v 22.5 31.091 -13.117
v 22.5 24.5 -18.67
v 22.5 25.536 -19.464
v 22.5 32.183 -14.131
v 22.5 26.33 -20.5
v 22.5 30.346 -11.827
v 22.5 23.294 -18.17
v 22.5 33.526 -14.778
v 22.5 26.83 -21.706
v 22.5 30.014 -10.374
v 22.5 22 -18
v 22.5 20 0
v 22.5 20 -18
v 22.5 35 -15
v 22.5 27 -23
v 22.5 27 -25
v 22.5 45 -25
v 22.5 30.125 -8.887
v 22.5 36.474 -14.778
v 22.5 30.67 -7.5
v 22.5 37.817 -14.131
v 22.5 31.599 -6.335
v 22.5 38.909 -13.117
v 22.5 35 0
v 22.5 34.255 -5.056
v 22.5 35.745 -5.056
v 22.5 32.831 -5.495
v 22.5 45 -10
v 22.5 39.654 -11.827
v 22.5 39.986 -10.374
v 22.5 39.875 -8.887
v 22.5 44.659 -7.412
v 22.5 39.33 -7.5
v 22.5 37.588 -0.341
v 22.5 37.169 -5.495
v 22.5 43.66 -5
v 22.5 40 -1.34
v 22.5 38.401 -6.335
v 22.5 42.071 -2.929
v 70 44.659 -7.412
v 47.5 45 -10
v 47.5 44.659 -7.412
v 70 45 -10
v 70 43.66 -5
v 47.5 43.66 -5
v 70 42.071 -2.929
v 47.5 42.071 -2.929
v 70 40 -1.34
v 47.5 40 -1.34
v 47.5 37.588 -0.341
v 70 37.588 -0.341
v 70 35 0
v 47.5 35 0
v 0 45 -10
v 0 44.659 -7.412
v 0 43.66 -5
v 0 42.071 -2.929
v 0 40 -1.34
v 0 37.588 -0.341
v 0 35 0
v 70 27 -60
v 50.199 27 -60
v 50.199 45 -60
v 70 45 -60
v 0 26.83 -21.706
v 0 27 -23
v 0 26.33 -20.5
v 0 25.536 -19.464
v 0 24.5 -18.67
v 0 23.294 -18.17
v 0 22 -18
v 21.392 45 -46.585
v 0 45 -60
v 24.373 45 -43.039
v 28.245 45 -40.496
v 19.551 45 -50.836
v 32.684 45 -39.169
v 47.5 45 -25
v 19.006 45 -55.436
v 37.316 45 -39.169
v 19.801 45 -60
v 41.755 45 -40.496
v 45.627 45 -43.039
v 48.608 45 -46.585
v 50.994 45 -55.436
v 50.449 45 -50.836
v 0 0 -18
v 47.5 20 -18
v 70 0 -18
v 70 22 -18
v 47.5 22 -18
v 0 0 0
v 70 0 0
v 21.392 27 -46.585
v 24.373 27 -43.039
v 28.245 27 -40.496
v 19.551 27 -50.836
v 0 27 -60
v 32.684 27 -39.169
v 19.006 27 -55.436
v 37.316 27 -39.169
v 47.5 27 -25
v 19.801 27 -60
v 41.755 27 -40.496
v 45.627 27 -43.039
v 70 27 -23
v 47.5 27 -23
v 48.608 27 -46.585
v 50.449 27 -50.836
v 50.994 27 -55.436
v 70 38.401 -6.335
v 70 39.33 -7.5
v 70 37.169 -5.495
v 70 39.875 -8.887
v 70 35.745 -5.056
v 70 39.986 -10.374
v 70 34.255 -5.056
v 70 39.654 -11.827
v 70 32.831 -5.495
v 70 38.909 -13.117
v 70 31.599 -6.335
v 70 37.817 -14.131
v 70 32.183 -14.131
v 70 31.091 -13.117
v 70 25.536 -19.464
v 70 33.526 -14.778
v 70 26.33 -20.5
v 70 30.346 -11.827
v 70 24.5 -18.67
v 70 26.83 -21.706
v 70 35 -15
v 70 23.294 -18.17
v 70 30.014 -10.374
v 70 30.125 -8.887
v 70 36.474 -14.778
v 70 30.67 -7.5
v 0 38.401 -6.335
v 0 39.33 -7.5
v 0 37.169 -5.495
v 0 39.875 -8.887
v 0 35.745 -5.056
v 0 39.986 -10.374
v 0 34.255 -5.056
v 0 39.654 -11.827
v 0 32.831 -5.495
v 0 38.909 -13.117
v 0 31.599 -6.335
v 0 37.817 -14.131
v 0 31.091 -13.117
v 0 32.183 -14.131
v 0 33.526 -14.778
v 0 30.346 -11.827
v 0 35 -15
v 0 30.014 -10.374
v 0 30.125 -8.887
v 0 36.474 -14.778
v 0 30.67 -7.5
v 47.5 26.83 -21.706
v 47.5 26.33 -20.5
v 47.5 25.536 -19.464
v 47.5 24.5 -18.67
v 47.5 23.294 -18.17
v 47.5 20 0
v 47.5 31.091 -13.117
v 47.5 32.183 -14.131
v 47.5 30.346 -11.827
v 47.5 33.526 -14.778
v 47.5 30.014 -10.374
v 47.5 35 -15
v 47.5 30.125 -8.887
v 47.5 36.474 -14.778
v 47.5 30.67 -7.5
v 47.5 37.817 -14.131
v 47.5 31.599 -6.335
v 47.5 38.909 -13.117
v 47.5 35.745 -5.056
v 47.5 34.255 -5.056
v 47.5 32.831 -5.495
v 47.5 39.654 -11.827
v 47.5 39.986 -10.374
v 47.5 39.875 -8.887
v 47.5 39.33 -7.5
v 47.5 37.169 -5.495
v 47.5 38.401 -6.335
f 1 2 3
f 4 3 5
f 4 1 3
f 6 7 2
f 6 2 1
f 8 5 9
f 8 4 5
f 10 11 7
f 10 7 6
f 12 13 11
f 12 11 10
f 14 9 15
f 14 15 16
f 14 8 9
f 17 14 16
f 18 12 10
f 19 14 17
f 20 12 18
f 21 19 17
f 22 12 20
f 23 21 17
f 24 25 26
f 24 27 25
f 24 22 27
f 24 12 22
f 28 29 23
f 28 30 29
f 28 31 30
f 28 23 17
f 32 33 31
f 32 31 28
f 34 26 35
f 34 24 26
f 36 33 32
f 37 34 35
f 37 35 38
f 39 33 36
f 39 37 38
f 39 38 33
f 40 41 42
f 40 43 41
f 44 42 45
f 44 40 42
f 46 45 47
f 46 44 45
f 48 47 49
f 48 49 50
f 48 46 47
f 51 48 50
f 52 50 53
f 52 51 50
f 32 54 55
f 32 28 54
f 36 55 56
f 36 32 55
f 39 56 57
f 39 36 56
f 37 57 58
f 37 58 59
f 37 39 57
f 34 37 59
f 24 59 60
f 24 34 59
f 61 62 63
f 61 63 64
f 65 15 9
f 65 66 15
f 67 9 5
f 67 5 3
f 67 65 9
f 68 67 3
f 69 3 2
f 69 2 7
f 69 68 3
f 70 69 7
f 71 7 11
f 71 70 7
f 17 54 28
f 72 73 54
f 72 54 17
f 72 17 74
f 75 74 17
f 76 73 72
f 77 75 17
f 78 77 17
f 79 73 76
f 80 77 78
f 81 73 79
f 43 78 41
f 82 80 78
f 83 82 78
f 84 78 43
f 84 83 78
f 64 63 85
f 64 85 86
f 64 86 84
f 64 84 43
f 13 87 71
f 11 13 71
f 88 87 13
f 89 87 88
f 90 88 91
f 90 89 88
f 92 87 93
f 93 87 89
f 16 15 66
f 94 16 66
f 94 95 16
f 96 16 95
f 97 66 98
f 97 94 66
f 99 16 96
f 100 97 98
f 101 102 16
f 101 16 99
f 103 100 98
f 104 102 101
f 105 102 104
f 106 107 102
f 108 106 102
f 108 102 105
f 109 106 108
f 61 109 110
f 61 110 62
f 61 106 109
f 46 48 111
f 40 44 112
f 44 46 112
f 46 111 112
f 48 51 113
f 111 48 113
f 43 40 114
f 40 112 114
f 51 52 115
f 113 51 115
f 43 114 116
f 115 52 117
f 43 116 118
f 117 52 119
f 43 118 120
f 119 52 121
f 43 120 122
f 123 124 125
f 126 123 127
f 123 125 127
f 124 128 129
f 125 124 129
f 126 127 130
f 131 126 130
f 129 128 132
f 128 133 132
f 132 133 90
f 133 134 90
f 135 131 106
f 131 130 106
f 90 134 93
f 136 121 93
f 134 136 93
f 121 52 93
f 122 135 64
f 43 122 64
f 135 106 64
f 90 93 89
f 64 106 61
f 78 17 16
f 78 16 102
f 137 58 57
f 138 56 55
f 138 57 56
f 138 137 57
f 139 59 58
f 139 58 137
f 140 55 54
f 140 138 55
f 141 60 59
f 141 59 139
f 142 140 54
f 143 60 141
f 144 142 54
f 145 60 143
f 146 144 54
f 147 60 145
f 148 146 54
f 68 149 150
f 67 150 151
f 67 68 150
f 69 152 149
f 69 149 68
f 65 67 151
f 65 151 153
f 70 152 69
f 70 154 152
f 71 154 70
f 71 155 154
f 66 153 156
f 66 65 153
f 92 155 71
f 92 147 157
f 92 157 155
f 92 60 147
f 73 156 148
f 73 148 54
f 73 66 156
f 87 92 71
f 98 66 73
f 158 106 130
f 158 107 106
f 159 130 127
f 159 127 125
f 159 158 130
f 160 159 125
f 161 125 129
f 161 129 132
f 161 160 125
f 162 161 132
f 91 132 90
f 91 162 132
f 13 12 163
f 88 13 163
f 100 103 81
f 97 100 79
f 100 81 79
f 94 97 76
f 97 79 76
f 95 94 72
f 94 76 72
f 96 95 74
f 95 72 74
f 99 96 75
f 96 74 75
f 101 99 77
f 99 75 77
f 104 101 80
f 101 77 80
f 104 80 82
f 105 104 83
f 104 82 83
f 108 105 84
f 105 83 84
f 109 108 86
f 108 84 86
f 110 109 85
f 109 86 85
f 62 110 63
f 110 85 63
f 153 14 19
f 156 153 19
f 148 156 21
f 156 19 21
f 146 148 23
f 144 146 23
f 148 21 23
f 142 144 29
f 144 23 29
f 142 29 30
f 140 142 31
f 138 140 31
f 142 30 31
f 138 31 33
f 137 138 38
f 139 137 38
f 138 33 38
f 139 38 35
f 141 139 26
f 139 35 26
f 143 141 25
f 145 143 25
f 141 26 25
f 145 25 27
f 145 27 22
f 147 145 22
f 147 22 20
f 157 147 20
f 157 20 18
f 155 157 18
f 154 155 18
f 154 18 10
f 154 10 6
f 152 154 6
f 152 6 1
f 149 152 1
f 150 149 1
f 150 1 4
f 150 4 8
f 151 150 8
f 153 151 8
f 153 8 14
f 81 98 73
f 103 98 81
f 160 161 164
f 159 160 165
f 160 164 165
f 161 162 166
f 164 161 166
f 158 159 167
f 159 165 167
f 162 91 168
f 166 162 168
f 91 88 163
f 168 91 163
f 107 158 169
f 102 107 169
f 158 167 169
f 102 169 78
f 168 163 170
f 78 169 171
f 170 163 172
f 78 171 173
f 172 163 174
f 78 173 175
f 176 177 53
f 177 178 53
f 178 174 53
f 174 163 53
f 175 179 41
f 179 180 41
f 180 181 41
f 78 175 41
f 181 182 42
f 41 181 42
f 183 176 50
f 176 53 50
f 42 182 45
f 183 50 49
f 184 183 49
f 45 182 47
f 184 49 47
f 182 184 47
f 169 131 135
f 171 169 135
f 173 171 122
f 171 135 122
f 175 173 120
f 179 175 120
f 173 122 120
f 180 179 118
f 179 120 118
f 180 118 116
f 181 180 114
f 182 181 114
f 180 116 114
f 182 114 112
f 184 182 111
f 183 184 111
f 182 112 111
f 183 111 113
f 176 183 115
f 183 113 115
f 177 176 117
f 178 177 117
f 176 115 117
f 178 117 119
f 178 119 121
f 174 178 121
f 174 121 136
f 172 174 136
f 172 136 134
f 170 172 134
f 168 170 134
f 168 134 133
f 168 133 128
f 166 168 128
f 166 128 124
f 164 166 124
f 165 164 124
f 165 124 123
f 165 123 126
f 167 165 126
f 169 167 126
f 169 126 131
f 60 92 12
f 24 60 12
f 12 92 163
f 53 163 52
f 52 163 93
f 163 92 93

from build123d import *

# Parameters (mm, degrees)
SKETCH1_W           = 70
SKETCH1_H           = 60
BOSS_EXTRUDE1_DEPTH = 45
SKETCH2_W           = 42
SKETCH2_H           = 27
CUT_EXTRUDE1_DEPTH  = 103.591422643
SKETCH3_R           = 16
CUT_EXTRUDE2_DEPTH  = 45
SKETCH4_W           = 25
SKETCH4_H           = 25
CUT_EXTRUDE3_DEPTH  = 25
FILLET1_R           = 10
FILLET2_R           = 5
SKETCH9_R           = 5
CUT_EXTRUDE4_DEPTH  = 103.591422643


with BuildPart() as part:
    # Sketch1 → Boss-Extrude1 (new body)
    with BuildSketch(Plane(origin=(0, 0, 0), x_dir=(1, 0, 0), z_dir=(0, 1, 0))):
        with Locations((35, 30)):
            Rectangle(SKETCH1_W, SKETCH1_H)
    extrude(amount=BOSS_EXTRUDE1_DEPTH)

    # Sketch2 → Cut-Extrude1 (cut, through all)
    with BuildSketch(Plane(origin=(70, 0, 0), x_dir=(0, 0, -1), z_dir=(1, 0, 0))):
        with Locations((39, 13.5)):
            Rectangle(SKETCH2_W, SKETCH2_H)
    extrude(amount=-CUT_EXTRUDE1_DEPTH, mode=Mode.SUBTRACT)

    # Sketch3 → Cut-Extrude2 (cut)
    with BuildSketch(Plane(origin=(0, 45, 0), x_dir=(1, 0, 0), z_dir=(0, 1, 0))):
        with Locations((35, 55)):
            Circle(SKETCH3_R)
    extrude(amount=-CUT_EXTRUDE2_DEPTH, mode=Mode.SUBTRACT)

    # Sketch4 → Cut-Extrude3 (cut)
    with BuildSketch(Plane.XY):
        with Locations((35, 32.5)):
            Rectangle(SKETCH4_W, SKETCH4_H)
    extrude(amount=-CUT_EXTRUDE3_DEPTH, mode=Mode.SUBTRACT)

    # Fillet1
    fillet1_edges = [part.edges().sort_by_distance(p)[0] for p in [
        (58.75, 45, 0),
        (11.25, 45, 0),
    ]]
    fillet(fillet1_edges, radius=FILLET1_R)

    # Fillet2
    fillet2_edges = [part.edges().sort_by_distance(p)[0] for p in [
        (11.25, 27, -18),
        (58.75, 27, -18),
    ]]
    fillet(fillet2_edges, radius=FILLET2_R)

    # Sketch9 → Cut-Extrude4 (cut, through all)
    with BuildSketch(Plane(origin=(70, 0, 0), x_dir=(0, 0, -1), z_dir=(1, 0, 0))):
        with Locations((10, 35)):
            Circle(SKETCH9_R)
    extrude(amount=-CUT_EXTRUDE4_DEPTH, mode=Mode.SUBTRACT)


solid = part.part
